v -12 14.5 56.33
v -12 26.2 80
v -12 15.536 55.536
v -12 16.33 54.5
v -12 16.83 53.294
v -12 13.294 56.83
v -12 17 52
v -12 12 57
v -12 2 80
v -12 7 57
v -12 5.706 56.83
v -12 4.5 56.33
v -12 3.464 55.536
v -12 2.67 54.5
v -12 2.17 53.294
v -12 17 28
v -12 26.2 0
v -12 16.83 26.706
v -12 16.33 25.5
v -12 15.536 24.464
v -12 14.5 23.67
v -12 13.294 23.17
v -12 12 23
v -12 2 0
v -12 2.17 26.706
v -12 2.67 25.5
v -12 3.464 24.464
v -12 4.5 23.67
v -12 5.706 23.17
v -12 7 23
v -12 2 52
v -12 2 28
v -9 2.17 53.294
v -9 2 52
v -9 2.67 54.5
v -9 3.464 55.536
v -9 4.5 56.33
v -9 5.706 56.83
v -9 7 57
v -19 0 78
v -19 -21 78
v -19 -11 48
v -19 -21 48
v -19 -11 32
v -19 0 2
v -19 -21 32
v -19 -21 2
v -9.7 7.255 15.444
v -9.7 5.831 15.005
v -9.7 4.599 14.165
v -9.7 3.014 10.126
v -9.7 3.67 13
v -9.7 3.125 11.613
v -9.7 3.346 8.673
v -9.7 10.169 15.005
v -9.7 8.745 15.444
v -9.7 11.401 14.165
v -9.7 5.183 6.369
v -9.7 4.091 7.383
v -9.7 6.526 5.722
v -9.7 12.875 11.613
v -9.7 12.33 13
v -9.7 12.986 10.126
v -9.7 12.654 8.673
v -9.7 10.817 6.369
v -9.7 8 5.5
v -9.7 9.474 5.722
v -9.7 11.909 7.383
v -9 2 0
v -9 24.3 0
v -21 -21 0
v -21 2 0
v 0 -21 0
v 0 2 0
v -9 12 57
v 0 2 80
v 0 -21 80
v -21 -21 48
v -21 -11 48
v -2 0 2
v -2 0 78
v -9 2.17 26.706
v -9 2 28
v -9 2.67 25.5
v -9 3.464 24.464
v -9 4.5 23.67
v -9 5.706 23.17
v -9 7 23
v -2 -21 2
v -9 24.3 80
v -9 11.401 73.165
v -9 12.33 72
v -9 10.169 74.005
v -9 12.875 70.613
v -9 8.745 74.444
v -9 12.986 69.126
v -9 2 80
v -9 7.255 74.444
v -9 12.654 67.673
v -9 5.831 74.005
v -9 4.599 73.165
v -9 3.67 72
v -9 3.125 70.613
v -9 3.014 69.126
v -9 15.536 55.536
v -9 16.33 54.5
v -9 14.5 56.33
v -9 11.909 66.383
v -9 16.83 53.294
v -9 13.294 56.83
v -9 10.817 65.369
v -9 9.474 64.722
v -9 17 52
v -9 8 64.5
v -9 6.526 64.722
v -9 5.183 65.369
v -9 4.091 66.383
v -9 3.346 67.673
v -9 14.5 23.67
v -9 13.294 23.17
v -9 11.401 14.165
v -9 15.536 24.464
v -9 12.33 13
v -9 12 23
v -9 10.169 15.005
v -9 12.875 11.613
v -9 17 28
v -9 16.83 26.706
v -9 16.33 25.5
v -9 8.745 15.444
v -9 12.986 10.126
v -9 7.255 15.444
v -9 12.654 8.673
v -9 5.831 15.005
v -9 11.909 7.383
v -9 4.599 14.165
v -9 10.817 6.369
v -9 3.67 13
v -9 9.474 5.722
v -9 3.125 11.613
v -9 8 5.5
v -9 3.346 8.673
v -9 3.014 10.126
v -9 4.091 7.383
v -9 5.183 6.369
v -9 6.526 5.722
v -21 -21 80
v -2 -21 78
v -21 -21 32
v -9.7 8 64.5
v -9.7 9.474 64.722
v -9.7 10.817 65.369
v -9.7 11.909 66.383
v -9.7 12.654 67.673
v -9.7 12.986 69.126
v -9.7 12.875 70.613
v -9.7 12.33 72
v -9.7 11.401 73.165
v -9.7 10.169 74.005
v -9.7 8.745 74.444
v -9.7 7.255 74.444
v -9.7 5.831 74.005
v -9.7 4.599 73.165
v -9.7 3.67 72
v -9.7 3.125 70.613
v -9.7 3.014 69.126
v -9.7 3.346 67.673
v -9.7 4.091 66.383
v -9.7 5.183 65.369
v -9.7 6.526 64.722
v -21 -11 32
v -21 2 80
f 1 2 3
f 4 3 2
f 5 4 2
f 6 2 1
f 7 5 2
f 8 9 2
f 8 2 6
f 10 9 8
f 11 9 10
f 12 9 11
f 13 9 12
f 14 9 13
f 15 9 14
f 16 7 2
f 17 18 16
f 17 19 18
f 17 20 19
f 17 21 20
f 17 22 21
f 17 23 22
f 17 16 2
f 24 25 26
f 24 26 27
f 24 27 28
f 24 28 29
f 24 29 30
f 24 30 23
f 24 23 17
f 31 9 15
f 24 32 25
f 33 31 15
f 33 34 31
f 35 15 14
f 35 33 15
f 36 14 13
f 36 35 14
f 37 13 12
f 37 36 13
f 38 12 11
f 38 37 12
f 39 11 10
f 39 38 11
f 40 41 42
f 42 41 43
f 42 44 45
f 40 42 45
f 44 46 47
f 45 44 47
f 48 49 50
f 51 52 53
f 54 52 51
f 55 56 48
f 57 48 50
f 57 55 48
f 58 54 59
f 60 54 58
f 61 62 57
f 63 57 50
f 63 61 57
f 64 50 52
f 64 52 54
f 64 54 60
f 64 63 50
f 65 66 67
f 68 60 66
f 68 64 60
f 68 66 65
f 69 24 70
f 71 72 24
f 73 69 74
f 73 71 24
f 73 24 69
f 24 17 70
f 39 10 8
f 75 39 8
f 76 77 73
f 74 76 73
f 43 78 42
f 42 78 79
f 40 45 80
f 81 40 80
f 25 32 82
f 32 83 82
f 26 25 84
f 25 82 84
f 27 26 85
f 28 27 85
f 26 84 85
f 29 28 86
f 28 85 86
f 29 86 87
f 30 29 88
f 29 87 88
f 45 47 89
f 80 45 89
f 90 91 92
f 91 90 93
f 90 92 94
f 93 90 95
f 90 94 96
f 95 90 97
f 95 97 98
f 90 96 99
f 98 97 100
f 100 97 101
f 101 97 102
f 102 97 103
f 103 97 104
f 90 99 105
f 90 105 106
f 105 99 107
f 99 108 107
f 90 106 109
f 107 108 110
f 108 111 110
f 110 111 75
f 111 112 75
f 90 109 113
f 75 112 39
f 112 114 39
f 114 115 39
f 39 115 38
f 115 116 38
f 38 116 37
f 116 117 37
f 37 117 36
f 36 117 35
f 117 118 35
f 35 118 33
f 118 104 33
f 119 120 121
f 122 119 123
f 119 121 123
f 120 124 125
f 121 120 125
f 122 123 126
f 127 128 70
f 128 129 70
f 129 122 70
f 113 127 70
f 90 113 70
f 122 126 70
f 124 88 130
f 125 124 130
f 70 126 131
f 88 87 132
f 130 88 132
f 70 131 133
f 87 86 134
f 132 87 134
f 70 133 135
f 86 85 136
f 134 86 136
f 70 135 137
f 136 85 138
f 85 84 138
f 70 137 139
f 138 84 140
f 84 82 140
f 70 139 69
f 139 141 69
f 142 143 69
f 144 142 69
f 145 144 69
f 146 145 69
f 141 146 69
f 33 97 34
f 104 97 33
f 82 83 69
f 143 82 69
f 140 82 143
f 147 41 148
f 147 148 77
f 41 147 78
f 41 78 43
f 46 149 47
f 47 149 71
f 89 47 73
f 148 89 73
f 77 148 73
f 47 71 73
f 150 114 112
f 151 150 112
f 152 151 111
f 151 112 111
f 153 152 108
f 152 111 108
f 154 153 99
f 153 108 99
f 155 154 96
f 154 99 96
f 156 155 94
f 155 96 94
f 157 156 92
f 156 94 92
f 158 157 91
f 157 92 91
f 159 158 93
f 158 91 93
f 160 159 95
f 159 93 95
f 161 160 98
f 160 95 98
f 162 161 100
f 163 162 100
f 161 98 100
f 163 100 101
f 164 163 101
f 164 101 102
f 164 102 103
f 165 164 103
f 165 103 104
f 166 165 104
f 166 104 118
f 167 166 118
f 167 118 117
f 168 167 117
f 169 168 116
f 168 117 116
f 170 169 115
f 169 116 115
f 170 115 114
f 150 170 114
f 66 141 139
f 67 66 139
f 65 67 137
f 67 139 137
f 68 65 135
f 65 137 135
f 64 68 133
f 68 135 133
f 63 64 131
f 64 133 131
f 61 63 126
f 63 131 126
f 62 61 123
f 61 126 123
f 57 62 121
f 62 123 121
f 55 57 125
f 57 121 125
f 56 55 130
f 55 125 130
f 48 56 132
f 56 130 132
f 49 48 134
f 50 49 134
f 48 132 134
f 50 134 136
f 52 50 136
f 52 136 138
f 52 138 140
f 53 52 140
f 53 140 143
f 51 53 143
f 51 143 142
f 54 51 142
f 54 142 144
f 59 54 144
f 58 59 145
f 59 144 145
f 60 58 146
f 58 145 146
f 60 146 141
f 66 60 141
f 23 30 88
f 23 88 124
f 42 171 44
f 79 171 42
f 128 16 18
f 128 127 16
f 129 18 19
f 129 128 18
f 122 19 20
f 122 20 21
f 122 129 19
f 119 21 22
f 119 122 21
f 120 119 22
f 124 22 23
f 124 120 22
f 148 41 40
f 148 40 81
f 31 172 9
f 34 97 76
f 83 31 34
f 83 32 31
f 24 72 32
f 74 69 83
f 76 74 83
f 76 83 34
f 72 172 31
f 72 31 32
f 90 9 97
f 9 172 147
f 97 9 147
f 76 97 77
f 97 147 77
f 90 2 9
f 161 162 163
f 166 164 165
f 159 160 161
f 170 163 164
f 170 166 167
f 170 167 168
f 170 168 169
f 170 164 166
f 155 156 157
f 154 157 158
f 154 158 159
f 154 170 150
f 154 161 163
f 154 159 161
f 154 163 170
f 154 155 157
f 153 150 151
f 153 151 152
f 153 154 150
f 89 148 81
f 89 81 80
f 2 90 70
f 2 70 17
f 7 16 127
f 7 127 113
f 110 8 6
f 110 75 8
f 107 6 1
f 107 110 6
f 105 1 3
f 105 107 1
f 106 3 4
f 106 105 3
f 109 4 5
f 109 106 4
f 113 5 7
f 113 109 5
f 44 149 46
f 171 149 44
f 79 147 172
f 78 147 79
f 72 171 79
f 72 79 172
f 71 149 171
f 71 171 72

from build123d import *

# Parameters (mm, degrees)
BOSS_EXTRU_1_DEPTH      = 2
BOSS_EXTRU_1_DEPTH_BACK = 21
ESQUISSE1_W             = 21
ESQUISSE1_H             = 80
ESQUISSE10_W            = 3
ESQUISSE10_H            = 80
BOSS_EXTRU_2_DEPTH      = 24.2
ESQUISSE11_W            = 34
ESQUISSE11_H            = 15
ENL_V_MAT_EXTRU_1_DEPTH = 3
CONG_1_R                = 5
ENL_V_MAT_EXTRU_2_DEPTH = 81
COQUE2_START            = -21
COQUE2_OUTLINE_W        = 17
COQUE2_OUTLINE_H        = 76
COQUE2_DEPTH            = 21
ESQUISSE15_W            = 16
ESQUISSE15_H            = 10
ENL_V_MAT_EXTRU_3_DEPTH = 2
ESQUISSE12_R            = 5
ENL_V_MAT_EXTRU_4_DEPTH = 0.7


# Read off the part's stored shape, not the designer's step: Coque2
with BuildPart() as part:
    # Esquisse1 → Boss.-Extru.1 (new, two sides: drawn at the far end of the back side and taken through both)
    with BuildSketch(Plane(origin=(0, 0, 0), x_dir=(1, 0, 0), z_dir=(0, 1, 0)).offset(-BOSS_EXTRU_1_DEPTH_BACK)):
        with Locations((-10.5, -40)):
            Rectangle(ESQUISSE1_W, ESQUISSE1_H)
    extrude(amount=BOSS_EXTRU_1_DEPTH + BOSS_EXTRU_1_DEPTH_BACK)

    # Esquisse10 → Boss.-Extru.2 (add)
    with BuildSketch(Plane(origin=(0, 2, 0), x_dir=(1, 0, 0), z_dir=(0, 1, 0))):
        with Locations((-10.5, -40)):
            Rectangle(ESQUISSE10_W, ESQUISSE10_H)
    extrude(amount=BOSS_EXTRU_2_DEPTH)

    # Esquisse11 → Enlèv. mat.-Extru.1 (cut)
    with BuildSketch(Plane.ZY.offset(12)):
        with Locations((40, 9.5)):
            Rectangle(ESQUISSE11_W, ESQUISSE11_H)
    extrude(amount=-ENL_V_MAT_EXTRU_1_DEPTH, mode=Mode.SUBTRACT)

    # Congé1
    cong_1_edges = [part.edges().sort_by_distance(p)[0] for p in [
        (-10.5, 17, 57),
        (-10.5, 2, 57),
        (-10.5, 2, 23),
        (-10.5, 17, 23),
    ]]
    fillet(cong_1_edges, radius=CONG_1_R)

    # Esquisse13 → Enlèv. mat.-Extru.2 (cut)
    with BuildSketch(Plane.XY.offset(80)):
        Polygon((-12, 26.2), (-9, 26.2), (-9, 24.3), align=None)
    extrude(amount=-ENL_V_MAT_EXTRU_2_DEPTH, mode=Mode.SUBTRACT)

    # Coque2 outline → Coque2 (cut)
    with BuildSketch(Plane(origin=(0, 0, 0), x_dir=(1, 0, 0), z_dir=(0, 1, 0)).offset(COQUE2_START)):
        with Locations((-10.5, -40)):
            Rectangle(COQUE2_OUTLINE_W, COQUE2_OUTLINE_H)
    extrude(amount=COQUE2_DEPTH, mode=Mode.SUBTRACT)

    # Esquisse15 → Enlèv. mat.-Extru.3 (cut)
    with BuildSketch(Plane.ZY.offset(21)):
        with Locations((40, -16)):
            Rectangle(ESQUISSE15_W, ESQUISSE15_H)
    extrude(amount=-ENL_V_MAT_EXTRU_3_DEPTH, mode=Mode.SUBTRACT)

    # Esquisse12 → Enlèv. mat.-Extru.4 (cut)
    with BuildSketch(Plane(origin=(-9, 0, 0), x_dir=(0, 0, -1), z_dir=(1, 0, 0))):
        with Locations((-69.5, 8)):
            Circle(ESQUISSE12_R)
        with Locations((-10.5, 8)):
            Circle(ESQUISSE12_R)
    extrude(amount=-ENL_V_MAT_EXTRU_4_DEPTH, mode=Mode.SUBTRACT)


solid = part.part
